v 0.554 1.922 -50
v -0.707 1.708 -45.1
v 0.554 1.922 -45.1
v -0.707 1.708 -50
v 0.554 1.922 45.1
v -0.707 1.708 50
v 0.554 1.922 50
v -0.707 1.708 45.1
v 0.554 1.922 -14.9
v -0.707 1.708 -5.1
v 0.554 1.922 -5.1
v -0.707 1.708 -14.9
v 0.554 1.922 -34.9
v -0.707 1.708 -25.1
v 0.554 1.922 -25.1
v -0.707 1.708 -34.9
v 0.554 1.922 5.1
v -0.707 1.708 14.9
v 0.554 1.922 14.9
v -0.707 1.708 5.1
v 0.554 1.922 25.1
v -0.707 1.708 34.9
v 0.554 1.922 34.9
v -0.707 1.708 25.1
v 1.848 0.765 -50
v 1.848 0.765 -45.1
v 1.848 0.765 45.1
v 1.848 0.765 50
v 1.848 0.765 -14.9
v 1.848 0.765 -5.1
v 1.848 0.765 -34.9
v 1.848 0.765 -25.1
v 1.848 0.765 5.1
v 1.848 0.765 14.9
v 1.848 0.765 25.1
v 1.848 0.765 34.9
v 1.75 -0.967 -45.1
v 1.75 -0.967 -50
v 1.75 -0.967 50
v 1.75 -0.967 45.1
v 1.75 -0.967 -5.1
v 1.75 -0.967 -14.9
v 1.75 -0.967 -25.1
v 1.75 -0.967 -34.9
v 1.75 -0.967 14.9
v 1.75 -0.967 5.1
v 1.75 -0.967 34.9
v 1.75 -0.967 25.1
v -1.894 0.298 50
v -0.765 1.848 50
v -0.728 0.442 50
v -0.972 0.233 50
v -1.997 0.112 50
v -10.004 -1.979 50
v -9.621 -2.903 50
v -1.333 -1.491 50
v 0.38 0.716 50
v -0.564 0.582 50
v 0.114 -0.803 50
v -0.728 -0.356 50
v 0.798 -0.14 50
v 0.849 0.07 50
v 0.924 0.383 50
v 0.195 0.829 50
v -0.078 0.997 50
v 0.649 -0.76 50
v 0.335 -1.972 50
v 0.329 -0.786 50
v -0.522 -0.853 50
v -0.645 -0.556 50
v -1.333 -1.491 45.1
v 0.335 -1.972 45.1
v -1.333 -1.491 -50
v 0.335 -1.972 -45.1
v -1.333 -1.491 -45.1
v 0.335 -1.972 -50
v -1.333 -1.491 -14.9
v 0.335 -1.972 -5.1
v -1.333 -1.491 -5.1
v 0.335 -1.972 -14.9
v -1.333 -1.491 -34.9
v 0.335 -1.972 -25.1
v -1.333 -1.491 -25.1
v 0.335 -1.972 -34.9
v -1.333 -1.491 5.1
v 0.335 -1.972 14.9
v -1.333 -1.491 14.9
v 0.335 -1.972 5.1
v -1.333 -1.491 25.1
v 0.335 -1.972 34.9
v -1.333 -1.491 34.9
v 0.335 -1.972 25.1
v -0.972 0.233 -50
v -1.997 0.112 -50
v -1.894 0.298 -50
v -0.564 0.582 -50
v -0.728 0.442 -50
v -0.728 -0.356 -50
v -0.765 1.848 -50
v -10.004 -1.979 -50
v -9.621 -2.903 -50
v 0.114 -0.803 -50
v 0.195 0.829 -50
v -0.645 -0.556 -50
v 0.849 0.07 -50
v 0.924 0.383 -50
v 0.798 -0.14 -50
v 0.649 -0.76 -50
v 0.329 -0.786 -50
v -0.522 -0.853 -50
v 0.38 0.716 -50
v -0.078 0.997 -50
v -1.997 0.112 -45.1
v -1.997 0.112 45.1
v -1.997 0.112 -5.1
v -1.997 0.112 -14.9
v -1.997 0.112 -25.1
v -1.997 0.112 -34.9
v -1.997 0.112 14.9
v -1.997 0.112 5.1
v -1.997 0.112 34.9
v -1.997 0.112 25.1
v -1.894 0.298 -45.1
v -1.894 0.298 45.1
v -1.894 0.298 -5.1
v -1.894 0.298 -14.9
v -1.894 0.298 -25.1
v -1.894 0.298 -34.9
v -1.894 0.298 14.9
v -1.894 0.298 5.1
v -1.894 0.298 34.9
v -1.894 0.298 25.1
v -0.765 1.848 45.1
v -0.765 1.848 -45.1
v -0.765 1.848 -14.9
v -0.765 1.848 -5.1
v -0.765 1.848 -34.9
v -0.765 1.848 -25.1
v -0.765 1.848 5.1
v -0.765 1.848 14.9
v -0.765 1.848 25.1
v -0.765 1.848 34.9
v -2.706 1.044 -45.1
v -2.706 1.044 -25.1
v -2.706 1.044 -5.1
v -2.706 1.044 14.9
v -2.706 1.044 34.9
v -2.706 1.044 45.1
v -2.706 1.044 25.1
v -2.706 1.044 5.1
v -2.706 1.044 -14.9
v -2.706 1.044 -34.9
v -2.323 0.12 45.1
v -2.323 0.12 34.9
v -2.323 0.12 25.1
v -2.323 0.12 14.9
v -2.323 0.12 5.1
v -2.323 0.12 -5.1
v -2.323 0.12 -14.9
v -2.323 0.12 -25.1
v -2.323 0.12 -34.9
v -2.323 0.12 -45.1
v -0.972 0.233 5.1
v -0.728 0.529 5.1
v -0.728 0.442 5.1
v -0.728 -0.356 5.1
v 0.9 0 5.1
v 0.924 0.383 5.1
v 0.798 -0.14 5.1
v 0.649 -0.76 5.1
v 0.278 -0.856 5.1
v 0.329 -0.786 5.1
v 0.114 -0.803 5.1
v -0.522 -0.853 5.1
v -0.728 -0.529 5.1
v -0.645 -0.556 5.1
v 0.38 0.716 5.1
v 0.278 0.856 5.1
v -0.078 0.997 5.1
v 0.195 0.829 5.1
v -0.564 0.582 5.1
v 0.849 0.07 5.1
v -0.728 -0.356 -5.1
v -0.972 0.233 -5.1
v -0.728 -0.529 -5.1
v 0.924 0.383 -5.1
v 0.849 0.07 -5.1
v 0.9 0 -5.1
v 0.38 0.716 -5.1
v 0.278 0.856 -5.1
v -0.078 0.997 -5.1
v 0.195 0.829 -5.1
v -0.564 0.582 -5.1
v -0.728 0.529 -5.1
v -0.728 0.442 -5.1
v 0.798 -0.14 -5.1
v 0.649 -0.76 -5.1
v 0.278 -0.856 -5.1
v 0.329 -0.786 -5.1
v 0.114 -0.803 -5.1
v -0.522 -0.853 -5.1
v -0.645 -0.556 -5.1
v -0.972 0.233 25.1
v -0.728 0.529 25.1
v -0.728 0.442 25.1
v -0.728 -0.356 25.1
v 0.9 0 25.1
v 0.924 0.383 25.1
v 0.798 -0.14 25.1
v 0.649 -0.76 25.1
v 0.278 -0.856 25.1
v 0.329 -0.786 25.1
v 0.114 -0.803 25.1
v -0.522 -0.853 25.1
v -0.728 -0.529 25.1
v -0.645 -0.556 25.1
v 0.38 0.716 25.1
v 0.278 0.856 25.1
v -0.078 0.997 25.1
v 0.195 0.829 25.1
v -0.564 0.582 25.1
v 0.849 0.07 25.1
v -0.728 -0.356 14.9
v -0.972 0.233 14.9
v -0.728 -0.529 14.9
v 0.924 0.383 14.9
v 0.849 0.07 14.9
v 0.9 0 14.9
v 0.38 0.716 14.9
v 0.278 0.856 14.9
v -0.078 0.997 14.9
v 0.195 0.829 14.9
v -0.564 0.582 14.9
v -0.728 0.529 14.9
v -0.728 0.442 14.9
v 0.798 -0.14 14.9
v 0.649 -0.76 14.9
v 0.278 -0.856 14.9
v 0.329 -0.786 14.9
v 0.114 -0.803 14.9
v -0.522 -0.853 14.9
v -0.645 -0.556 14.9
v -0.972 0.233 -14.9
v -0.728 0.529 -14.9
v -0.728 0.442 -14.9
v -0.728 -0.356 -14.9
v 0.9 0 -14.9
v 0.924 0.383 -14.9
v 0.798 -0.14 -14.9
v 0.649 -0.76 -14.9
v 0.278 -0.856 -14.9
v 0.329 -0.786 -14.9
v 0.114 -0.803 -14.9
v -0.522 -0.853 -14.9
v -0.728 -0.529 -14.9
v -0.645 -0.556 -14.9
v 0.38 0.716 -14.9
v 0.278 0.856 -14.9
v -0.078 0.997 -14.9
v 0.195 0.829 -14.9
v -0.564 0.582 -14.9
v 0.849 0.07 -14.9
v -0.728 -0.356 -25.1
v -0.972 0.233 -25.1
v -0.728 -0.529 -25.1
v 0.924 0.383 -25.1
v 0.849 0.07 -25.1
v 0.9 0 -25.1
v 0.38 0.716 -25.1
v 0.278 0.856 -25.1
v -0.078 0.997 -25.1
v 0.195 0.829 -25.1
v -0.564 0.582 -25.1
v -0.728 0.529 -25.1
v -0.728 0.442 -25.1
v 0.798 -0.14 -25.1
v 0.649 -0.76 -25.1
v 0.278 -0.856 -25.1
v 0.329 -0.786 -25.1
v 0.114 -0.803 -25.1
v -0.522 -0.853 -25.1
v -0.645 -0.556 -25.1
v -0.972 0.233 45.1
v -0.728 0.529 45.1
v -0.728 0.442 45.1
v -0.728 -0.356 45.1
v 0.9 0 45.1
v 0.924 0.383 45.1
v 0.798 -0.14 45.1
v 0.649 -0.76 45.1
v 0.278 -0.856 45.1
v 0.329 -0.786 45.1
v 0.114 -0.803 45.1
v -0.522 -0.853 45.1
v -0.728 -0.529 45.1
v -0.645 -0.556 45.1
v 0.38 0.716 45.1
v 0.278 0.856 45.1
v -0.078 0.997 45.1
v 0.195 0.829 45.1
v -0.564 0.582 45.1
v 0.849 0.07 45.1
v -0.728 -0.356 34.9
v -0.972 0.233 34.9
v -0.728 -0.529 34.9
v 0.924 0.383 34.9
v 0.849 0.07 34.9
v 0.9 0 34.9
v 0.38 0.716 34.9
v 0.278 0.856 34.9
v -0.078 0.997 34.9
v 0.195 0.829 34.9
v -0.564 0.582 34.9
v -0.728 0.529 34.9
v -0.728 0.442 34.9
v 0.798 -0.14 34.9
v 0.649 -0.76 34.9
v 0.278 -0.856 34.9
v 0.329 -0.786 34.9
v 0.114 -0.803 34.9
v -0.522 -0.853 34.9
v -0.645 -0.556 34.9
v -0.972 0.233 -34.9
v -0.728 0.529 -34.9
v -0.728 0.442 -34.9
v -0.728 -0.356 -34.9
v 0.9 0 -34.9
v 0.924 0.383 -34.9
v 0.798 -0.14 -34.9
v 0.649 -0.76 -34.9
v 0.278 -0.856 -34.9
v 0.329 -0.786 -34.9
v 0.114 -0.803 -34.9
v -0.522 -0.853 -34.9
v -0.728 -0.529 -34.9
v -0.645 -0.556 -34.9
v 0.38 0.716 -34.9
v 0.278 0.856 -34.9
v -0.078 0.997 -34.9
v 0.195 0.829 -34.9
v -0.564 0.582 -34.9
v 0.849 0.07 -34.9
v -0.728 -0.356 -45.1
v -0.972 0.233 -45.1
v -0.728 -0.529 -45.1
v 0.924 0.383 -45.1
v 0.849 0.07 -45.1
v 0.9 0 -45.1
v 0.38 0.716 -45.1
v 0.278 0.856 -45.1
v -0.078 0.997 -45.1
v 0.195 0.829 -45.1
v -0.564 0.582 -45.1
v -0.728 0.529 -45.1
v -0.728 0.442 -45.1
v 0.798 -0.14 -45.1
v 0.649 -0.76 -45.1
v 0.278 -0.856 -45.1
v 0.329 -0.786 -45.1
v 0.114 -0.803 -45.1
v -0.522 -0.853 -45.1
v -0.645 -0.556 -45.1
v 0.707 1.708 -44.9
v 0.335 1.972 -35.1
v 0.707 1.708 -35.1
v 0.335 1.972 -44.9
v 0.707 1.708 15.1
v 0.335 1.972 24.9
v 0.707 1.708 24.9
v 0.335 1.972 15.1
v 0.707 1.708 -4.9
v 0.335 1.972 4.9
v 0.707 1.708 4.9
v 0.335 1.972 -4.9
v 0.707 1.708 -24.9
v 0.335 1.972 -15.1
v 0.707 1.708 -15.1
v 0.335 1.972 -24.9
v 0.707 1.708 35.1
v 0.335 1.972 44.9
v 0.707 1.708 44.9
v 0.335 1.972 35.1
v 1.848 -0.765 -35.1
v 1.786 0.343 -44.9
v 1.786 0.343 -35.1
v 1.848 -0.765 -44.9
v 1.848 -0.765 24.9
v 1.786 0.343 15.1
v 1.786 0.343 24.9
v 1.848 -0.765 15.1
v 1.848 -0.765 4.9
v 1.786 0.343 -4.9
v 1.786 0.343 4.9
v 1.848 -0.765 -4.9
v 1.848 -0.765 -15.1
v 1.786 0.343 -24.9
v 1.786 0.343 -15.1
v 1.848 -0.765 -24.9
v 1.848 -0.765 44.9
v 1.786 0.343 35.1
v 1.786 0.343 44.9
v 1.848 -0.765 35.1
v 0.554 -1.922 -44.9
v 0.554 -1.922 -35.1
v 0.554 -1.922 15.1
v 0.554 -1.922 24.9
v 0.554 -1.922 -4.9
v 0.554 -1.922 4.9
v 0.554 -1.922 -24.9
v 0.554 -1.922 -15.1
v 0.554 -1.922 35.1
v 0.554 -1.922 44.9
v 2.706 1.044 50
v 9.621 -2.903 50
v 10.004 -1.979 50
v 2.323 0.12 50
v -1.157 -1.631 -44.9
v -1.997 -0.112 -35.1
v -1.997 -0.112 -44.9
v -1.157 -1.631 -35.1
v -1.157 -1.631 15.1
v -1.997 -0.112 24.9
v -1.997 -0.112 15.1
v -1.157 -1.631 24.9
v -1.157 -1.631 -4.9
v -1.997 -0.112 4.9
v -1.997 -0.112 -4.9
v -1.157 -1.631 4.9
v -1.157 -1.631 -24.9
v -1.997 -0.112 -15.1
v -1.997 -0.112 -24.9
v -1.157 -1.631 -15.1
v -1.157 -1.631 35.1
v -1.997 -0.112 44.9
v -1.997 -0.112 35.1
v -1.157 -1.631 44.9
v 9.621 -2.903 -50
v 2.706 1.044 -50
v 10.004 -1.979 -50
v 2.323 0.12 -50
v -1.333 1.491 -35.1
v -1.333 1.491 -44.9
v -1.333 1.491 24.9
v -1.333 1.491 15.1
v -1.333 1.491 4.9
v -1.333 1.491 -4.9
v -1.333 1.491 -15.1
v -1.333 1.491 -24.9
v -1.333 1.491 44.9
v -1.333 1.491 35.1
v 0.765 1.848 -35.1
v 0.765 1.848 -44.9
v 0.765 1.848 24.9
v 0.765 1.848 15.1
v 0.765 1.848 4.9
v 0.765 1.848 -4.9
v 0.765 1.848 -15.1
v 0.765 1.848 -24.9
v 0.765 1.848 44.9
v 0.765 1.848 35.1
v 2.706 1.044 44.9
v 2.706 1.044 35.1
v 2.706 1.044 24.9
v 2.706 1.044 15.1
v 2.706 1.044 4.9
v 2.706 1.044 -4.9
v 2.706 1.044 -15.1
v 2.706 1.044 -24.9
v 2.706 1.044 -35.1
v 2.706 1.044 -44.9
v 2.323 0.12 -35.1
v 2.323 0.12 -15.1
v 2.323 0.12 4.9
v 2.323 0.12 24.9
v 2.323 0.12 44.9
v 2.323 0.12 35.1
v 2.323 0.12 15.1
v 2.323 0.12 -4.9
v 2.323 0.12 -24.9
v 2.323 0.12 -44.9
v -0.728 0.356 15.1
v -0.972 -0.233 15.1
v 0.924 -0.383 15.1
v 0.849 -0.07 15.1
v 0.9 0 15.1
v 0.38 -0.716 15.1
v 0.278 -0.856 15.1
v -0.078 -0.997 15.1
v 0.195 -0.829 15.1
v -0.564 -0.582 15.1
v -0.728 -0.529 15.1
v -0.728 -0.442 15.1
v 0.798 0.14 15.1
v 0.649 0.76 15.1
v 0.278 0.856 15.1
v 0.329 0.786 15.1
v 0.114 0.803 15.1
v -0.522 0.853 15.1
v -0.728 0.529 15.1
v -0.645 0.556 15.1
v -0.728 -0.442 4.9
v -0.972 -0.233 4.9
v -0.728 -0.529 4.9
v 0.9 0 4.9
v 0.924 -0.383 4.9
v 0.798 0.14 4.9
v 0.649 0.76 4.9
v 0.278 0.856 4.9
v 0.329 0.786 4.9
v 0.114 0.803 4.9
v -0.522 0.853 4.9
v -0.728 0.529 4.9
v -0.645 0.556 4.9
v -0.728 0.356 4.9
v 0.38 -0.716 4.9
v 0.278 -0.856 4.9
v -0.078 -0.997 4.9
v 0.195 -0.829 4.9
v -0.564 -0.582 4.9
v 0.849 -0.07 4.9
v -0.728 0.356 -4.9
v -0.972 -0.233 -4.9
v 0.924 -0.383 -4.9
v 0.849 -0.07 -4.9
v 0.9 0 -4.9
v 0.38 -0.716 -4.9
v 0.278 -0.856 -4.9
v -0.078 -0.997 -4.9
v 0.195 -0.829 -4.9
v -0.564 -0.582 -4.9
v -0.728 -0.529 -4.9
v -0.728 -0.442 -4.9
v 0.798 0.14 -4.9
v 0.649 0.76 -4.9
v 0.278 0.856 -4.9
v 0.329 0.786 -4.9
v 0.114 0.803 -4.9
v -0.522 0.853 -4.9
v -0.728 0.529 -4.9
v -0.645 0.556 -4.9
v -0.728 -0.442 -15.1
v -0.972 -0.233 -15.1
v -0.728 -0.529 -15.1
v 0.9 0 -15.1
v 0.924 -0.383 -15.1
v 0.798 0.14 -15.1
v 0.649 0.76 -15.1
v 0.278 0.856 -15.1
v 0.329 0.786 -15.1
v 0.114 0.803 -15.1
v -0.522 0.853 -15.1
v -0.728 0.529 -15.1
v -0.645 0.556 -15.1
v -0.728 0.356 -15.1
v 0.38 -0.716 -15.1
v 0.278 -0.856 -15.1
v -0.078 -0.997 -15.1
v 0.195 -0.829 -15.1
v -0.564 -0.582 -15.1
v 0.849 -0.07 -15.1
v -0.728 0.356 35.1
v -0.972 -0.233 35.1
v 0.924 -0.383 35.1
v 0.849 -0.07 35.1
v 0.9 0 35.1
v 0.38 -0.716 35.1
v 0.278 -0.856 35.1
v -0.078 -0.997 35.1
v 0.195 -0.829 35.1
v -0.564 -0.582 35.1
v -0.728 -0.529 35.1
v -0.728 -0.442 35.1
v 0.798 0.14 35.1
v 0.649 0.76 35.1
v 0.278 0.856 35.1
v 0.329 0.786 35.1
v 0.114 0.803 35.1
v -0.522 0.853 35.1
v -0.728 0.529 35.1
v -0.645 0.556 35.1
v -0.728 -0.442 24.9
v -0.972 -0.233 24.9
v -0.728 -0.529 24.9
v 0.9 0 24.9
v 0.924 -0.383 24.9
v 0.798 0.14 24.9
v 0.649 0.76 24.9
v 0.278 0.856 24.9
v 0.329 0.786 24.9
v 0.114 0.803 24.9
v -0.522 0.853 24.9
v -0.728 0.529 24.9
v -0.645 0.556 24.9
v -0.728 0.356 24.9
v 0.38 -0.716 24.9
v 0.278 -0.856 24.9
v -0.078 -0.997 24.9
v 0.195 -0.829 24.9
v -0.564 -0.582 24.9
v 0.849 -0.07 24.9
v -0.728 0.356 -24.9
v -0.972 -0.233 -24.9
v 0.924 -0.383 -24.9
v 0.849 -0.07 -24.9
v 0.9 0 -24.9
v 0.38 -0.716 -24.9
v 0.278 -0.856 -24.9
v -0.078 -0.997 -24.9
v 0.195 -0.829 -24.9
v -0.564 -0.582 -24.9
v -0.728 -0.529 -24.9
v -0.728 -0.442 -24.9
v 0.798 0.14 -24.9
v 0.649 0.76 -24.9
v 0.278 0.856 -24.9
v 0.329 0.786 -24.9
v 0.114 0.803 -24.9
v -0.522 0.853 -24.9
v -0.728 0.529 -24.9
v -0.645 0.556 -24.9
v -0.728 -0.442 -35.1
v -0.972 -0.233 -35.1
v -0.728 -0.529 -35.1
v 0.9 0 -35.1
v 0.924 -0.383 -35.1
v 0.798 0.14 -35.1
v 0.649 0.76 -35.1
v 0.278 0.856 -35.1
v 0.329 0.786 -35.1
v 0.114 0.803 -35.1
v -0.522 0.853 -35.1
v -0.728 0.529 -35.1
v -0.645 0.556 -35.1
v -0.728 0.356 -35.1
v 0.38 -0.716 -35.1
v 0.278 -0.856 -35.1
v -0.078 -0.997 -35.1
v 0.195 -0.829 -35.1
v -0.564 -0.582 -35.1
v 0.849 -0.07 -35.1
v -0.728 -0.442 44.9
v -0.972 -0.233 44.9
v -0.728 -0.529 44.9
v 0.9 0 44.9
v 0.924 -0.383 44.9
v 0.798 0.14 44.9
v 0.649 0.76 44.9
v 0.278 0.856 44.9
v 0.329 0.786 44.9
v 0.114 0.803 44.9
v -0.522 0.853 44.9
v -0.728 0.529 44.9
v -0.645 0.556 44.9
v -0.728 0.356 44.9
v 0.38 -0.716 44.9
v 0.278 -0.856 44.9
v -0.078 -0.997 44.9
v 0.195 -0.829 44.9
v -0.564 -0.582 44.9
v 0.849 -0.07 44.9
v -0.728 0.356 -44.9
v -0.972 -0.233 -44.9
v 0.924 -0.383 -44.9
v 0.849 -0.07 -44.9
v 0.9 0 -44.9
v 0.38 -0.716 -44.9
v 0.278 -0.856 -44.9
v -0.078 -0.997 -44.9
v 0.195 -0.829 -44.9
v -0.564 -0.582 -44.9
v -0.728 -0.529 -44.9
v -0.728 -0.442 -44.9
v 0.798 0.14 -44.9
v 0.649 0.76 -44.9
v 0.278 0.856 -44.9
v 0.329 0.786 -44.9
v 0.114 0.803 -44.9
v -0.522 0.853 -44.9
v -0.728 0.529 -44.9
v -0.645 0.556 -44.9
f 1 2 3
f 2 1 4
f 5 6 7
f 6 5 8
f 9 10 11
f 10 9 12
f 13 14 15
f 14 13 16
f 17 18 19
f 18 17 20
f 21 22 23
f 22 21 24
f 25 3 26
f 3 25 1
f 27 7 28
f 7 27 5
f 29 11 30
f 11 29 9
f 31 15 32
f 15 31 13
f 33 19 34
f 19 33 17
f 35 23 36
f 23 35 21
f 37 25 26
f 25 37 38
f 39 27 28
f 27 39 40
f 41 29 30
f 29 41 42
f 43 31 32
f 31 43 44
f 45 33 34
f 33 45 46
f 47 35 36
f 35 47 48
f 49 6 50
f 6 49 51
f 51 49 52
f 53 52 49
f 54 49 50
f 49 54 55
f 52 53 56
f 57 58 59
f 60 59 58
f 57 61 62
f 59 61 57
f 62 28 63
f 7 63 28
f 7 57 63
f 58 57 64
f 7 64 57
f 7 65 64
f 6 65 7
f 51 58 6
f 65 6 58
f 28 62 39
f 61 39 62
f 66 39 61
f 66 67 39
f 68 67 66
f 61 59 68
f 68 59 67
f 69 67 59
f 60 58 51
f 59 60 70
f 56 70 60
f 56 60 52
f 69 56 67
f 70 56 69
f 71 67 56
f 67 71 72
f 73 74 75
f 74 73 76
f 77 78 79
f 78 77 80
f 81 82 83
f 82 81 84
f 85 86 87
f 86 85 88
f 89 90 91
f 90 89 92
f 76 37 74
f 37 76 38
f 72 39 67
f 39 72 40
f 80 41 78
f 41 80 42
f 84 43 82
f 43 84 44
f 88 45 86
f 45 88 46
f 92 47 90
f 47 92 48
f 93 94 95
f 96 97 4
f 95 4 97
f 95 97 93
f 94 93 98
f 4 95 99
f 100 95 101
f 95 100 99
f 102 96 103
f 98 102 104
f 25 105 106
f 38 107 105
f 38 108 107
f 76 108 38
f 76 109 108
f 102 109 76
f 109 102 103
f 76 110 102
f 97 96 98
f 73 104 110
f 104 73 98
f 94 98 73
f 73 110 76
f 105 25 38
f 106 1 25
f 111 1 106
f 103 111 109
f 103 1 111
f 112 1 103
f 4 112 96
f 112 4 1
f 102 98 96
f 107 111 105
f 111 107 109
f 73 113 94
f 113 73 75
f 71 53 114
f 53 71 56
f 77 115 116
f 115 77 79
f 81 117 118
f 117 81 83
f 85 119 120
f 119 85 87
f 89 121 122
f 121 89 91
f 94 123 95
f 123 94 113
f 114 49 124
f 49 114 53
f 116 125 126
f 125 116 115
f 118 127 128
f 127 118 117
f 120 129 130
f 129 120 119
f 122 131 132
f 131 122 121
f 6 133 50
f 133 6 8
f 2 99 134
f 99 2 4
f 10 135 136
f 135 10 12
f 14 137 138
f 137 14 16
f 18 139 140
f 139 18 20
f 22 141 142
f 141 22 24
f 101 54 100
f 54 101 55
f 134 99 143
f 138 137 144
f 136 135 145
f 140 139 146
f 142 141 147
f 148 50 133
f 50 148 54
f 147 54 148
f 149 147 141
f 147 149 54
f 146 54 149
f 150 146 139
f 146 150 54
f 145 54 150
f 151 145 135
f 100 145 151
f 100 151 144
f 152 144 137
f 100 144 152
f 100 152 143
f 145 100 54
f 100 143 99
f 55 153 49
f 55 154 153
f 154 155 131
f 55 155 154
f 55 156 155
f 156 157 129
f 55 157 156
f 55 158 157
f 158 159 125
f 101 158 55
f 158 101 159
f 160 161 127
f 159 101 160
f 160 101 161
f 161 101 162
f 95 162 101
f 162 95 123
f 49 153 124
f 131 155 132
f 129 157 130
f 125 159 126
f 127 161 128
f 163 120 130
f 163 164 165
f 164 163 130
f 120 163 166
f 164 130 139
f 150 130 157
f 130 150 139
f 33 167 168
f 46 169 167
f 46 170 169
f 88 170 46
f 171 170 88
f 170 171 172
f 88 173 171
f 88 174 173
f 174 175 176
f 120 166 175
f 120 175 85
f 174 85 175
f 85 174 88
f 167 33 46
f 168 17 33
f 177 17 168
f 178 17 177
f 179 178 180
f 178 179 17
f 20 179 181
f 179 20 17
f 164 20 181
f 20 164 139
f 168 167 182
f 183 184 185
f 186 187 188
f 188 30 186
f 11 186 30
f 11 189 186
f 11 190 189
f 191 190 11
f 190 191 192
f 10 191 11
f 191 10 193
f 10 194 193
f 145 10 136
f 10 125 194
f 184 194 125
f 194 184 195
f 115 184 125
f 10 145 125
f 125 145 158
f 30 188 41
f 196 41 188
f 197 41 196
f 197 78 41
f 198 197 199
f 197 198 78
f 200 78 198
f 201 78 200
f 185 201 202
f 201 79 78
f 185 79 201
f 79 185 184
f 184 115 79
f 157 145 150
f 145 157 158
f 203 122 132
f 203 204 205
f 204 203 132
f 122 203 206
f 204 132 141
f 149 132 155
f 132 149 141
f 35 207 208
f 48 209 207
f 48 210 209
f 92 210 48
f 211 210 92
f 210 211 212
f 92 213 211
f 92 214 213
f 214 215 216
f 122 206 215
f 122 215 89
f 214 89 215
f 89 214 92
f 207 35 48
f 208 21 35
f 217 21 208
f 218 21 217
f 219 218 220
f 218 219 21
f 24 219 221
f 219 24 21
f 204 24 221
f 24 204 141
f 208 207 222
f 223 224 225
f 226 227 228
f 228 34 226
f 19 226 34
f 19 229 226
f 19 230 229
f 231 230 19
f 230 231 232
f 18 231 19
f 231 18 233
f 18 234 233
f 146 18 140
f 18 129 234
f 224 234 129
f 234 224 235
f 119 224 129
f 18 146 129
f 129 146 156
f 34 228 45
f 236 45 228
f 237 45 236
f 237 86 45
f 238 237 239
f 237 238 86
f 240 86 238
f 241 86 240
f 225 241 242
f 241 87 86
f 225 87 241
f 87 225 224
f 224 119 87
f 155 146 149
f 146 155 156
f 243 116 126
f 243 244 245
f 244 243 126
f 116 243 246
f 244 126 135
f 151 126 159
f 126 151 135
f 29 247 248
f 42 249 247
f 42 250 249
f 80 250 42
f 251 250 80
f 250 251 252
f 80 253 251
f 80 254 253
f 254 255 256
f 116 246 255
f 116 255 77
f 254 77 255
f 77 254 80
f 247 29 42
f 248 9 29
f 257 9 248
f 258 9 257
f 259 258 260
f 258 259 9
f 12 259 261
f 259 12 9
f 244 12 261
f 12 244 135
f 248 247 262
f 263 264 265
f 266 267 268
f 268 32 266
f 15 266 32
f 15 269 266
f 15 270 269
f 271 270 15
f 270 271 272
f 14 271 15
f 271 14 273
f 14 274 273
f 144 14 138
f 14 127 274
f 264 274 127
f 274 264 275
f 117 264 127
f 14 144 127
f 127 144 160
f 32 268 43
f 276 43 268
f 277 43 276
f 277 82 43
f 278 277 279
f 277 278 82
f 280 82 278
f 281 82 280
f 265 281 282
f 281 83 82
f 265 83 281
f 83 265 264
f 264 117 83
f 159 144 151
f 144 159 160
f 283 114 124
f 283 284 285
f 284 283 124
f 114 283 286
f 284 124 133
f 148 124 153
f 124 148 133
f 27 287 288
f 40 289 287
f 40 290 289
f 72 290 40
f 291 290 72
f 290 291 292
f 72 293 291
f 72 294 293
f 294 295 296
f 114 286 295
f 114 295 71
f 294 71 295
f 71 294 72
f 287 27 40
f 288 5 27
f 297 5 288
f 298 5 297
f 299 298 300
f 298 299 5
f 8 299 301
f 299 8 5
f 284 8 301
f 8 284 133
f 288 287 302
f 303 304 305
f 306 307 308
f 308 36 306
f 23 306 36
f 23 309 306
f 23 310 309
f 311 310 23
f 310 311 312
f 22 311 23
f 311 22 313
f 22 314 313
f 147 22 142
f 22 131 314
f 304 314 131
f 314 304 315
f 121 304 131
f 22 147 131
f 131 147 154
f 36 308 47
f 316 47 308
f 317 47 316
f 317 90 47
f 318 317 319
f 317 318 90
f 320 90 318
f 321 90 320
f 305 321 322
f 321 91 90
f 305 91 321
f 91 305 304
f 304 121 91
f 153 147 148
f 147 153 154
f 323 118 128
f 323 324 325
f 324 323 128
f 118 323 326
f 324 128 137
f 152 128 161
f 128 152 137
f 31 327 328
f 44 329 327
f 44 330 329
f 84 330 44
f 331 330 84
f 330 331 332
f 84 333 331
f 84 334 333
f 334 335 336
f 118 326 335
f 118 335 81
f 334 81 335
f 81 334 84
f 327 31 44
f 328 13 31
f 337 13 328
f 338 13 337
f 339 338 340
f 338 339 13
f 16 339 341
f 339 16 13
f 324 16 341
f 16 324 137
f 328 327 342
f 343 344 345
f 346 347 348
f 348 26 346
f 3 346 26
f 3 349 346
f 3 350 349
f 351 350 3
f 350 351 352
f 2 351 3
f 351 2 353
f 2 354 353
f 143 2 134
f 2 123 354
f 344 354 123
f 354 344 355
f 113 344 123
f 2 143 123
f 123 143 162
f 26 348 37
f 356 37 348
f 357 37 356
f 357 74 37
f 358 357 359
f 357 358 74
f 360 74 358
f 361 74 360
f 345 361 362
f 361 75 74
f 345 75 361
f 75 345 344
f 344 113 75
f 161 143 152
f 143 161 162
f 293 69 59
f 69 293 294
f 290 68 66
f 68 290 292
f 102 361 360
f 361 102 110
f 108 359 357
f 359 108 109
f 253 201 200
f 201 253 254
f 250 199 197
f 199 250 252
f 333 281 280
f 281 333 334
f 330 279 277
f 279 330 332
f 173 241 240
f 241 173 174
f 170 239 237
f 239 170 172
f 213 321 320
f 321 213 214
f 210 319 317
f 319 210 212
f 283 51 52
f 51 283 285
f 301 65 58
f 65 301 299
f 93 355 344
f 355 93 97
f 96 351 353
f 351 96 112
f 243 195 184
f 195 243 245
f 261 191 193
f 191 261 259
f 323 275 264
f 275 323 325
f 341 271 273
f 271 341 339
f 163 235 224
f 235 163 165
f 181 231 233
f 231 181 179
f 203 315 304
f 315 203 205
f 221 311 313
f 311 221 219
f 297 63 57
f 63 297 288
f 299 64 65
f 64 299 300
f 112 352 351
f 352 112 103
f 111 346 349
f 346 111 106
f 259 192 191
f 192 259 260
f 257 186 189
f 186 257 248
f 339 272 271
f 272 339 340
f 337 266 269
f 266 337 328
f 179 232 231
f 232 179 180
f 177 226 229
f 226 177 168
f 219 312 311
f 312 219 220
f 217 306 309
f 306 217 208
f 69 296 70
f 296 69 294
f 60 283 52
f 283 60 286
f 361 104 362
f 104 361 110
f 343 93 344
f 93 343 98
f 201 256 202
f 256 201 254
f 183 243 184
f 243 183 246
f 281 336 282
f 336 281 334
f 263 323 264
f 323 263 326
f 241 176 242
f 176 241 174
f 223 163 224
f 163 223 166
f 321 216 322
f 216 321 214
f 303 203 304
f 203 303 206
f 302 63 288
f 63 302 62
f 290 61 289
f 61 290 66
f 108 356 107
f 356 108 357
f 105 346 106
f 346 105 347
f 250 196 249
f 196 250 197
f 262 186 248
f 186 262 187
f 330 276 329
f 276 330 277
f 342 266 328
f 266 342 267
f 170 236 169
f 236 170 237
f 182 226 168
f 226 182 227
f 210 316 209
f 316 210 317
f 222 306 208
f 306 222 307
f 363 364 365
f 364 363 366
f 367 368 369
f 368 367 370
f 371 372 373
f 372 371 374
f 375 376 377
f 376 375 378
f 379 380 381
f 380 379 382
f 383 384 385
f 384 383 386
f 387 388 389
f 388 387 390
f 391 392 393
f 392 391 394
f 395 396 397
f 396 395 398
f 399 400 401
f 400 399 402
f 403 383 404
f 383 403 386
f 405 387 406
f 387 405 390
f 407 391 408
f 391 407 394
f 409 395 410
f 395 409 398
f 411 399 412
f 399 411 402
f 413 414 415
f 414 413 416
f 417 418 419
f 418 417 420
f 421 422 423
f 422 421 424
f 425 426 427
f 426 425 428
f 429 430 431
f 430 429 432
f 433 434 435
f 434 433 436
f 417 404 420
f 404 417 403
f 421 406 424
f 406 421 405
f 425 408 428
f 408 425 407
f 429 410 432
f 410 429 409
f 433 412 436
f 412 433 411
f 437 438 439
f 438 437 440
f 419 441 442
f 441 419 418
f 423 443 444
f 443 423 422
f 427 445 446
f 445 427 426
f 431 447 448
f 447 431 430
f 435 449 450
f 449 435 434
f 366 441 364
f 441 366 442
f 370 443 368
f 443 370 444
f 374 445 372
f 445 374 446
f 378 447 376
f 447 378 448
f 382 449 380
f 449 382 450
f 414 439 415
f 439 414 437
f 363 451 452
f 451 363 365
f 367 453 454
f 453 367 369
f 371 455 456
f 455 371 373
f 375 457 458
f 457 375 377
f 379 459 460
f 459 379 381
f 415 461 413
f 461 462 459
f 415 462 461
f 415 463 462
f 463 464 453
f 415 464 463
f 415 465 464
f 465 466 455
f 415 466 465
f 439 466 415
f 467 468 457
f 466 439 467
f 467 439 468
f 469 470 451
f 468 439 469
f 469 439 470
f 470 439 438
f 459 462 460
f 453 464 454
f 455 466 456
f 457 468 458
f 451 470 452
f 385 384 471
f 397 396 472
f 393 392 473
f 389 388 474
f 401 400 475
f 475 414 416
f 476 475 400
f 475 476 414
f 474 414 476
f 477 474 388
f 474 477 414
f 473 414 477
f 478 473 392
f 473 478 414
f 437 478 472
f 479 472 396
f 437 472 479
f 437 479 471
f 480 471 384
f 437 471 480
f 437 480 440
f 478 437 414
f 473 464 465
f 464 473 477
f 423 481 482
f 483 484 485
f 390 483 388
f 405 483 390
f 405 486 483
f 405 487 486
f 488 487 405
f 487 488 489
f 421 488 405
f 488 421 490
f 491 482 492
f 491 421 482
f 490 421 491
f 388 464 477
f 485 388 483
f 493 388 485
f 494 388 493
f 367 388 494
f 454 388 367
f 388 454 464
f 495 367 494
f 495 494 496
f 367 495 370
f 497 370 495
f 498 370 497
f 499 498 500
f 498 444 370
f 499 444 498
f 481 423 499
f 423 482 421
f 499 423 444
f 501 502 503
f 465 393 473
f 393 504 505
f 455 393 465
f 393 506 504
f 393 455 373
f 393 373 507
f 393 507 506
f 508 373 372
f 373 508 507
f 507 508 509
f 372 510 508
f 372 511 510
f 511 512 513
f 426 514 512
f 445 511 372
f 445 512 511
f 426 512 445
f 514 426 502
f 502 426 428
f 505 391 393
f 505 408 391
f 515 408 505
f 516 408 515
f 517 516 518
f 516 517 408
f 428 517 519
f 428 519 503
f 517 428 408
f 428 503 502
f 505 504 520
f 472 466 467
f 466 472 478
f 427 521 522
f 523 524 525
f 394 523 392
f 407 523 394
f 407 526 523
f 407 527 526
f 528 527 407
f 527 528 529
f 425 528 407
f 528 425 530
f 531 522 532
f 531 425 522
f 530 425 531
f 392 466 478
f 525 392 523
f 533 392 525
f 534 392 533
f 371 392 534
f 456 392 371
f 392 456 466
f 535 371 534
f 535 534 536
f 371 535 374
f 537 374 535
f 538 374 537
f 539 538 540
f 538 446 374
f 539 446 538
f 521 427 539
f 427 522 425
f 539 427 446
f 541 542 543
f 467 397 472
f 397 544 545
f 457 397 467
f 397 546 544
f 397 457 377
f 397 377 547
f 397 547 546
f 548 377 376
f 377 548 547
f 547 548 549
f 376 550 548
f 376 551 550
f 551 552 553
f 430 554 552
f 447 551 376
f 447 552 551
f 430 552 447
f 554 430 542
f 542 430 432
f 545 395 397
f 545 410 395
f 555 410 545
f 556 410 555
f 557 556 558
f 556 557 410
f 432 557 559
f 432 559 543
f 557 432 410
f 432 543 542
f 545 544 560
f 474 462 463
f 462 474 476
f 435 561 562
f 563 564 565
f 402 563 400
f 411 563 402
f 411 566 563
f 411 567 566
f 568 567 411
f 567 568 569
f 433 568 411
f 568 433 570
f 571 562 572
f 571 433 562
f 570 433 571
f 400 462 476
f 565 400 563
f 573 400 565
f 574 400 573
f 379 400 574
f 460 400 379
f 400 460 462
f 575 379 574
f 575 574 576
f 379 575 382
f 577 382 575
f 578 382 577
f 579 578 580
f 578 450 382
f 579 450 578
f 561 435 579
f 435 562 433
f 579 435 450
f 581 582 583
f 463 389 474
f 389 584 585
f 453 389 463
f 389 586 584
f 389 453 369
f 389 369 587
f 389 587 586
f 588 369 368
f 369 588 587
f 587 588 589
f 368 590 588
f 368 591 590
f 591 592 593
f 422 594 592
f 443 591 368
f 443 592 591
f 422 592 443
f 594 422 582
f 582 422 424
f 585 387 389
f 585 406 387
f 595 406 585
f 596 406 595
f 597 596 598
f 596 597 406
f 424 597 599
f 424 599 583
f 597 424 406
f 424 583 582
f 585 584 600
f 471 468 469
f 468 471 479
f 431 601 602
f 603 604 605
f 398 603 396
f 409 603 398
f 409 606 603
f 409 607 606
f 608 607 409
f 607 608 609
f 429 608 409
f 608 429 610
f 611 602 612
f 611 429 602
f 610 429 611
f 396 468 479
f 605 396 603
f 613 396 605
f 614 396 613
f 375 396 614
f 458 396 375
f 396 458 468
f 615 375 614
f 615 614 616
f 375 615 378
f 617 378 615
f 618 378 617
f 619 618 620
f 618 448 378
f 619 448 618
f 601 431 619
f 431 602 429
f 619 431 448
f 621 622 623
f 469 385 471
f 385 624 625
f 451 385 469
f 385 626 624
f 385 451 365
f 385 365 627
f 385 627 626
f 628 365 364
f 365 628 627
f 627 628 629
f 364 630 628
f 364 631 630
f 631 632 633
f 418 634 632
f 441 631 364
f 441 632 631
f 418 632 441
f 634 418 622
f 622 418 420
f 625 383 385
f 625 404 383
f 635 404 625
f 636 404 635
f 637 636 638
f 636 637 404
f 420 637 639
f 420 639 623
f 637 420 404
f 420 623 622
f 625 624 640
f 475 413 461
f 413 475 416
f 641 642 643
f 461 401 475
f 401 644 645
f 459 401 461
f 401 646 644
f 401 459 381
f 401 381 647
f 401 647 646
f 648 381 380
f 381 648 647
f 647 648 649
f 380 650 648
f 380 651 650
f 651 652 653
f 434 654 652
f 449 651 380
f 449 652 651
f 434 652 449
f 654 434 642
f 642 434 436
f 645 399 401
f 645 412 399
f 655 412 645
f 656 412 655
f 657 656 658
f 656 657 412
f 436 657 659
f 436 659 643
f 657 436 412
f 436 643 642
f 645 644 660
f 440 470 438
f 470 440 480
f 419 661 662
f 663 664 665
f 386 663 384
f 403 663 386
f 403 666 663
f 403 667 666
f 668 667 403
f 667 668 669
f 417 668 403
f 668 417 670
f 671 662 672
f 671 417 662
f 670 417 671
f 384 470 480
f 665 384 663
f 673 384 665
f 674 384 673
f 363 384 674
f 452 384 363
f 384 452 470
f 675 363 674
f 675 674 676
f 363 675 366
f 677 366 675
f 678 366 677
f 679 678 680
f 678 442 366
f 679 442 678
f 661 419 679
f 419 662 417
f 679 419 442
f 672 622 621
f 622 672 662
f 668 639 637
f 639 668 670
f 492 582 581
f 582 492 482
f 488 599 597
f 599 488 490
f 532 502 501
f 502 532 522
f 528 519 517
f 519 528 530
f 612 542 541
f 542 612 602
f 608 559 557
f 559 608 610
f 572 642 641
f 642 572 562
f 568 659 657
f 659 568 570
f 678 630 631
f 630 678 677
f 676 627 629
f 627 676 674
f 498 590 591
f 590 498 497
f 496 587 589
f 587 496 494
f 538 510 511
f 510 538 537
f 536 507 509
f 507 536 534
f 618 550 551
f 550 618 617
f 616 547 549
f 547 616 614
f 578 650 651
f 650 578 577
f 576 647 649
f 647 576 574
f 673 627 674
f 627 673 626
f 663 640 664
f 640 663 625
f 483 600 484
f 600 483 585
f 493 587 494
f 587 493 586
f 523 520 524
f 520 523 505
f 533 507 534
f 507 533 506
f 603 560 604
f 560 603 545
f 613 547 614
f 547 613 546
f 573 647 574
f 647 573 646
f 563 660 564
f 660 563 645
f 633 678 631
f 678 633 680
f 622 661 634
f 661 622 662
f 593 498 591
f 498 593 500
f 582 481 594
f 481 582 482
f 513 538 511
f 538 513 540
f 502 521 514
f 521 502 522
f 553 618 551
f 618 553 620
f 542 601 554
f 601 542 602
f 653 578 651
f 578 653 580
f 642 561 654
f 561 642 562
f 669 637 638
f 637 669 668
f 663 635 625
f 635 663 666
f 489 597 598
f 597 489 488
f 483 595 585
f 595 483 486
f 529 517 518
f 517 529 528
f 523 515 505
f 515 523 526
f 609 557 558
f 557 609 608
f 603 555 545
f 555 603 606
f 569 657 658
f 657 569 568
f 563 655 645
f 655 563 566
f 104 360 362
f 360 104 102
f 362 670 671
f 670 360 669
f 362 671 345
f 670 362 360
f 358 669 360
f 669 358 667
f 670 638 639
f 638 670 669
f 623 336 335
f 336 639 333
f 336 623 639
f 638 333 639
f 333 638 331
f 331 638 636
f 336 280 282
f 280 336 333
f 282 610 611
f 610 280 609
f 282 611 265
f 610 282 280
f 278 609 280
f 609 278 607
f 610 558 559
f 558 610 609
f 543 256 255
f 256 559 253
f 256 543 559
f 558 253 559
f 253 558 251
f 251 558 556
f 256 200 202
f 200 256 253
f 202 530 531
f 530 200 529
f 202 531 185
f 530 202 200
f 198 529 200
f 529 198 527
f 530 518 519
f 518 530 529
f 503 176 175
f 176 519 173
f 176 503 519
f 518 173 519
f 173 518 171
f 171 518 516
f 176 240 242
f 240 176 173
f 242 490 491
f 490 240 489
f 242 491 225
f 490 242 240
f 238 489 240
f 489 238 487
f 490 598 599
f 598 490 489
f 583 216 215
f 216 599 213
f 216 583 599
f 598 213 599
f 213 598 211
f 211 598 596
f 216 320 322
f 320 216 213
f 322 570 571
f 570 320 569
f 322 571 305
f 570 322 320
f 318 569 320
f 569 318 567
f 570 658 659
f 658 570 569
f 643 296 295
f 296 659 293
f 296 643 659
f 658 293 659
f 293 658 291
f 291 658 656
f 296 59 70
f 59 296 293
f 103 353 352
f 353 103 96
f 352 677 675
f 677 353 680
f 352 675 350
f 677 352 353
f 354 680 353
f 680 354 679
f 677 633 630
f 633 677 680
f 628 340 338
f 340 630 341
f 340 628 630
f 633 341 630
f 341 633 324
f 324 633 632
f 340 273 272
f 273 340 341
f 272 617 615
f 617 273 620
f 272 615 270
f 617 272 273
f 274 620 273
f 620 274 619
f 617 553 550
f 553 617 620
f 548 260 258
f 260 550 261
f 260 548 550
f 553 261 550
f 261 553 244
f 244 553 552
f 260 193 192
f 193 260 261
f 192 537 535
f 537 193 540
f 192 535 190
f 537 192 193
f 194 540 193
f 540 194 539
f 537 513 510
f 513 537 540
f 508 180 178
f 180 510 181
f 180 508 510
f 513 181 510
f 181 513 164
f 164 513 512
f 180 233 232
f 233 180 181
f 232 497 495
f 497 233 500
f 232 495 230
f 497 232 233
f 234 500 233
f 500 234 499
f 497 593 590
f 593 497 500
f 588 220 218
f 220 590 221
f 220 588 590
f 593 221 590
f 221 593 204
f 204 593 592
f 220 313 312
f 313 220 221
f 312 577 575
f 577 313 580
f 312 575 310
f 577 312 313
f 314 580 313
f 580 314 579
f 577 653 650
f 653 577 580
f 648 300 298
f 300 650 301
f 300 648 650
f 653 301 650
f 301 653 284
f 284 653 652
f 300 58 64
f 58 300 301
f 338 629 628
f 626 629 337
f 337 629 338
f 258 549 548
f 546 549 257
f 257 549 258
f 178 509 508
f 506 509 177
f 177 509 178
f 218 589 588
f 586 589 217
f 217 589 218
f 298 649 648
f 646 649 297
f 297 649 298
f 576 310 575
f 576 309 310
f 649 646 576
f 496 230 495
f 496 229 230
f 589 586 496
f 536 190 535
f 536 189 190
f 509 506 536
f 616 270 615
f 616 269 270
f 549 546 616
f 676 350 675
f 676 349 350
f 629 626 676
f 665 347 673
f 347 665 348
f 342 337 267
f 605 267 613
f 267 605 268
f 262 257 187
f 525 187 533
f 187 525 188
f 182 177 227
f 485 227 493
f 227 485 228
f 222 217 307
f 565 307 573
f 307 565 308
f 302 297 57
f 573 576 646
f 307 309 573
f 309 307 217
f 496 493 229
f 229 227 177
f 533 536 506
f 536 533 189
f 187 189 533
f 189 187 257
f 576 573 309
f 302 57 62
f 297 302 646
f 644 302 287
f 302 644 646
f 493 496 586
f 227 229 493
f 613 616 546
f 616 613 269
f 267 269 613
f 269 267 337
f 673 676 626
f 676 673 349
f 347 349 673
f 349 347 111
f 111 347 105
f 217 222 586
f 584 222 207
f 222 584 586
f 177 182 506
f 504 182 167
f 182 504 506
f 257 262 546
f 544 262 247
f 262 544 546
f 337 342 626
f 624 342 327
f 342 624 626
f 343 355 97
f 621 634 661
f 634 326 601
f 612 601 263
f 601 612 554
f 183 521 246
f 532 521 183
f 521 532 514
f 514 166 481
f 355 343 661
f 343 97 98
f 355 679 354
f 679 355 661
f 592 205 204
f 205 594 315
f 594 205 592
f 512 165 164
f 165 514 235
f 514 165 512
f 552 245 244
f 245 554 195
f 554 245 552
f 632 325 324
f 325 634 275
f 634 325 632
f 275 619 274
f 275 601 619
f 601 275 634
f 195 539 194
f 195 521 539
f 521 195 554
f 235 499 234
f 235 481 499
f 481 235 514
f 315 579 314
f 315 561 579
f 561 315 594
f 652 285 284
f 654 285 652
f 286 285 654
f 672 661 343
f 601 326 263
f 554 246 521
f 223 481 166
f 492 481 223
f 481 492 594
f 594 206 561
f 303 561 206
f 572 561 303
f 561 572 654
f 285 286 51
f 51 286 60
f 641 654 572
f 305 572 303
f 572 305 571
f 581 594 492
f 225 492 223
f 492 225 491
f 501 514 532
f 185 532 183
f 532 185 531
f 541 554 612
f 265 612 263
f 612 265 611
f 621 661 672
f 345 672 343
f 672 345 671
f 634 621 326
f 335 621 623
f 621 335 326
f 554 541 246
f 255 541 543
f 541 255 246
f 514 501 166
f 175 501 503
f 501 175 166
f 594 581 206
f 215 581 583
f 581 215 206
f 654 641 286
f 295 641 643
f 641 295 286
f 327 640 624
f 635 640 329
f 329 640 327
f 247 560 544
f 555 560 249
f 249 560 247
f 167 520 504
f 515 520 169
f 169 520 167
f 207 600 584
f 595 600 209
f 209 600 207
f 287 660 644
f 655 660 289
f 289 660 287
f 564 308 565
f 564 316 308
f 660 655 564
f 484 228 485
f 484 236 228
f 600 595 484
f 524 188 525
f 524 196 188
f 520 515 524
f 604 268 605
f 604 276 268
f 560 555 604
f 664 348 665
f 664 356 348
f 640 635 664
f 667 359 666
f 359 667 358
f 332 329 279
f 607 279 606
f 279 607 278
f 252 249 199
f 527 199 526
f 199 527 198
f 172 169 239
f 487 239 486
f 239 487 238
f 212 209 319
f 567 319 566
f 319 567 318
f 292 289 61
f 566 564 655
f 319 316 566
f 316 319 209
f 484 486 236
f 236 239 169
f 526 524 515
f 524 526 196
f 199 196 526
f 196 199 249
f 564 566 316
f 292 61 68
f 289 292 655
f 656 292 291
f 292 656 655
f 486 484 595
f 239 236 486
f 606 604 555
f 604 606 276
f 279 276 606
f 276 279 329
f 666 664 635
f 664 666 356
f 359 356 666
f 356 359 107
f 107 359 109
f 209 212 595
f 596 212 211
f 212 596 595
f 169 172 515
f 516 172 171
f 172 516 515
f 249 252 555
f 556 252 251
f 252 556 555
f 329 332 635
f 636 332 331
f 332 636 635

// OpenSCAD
/*******************************************************************************\
|						Library for modeling a Piano Hinge.						|
|							Copyright 2026 Joshua Lucas 						|
\*******************************************************************************/

// Animated demo/test.
piano_hinge (
	length = sin ( 360 * $t ) * 100 + 100,
	angle = 135 * sin ( 360 * $t ) - 45
);

// Create a piano hinge.
module piano_hinge (
	length,
	angle			= 0,
	center			= true,
	clearance		= 0.1,
	diameter		= 4,
	knuckleLength	= 10,
	leafColors		= [ "LightBlue", "Orange" ],
	leafThickness	= 1,
	leafWidth		= 10,
	pinColor		= "LightGreen",
	pinDiameter		= 2
) {
	// Pin
	color ( pinColor ) {
		_piano_hinge_pin (
			length		= length,
			clearance	= clearance,
			pinDiameter	= pinDiameter
		);
	}

	// Leaves
	for ( side = [ 0, 1 ] ) {
		rotate ( ( 2 * side - 1 ) * angle / 2 ) {
			color ( leafColors[side] ) {
				_piano_hinge_leaf (
					center			= center,
					clearance		= clearance,
					diameter		= diameter,
					knuckleLength	= knuckleLength,
					leafThickness	= leafThickness,
					leafWidth		= leafWidth,
					length 			= length,
					pinDiameter		= pinDiameter,
					side			= side
				);
			}
		}
	}
}

module _piano_hinge_leaf (
	center,
	clearance,
	diameter,
	knuckleLength,
	leafThickness,
	leafWidth,
	length,
	pinDiameter,
	side
) {
	// Knuckles
	difference () {
		union () {
			cylinder ( d = diameter, h = length, center = true );

			// Leaf
			translate ( [
				( 2 * side - 1 ) * leafWidth / 2,
				( diameter - leafThickness ) / 2,
				0
			] ) {
				cube ( [ leafWidth, leafThickness, length ], center = true );
			}
		}

		// Pin hole
		translate ( [ 0, 0, -clearance ] ) {
			cylinder (
				d = pinDiameter,
				h = length + 2 * clearance,
				center = true
			);
		}

		knuckle_count = floor ( length / knuckleLength / 2 );
		for ( i = [ 0 : knuckle_count ], j = [ 1, -1 ] ) {
			translate ( [
				0,
				0,
				j * ( 2 * i + side ) * knuckleLength + ( center ? 0 : knuckleLength / 2 )
			] ) {
				cube (
					[
						diameter,
						diameter,
						knuckleLength
					] + clearance * [ 2, 2, 2 ],
					center = true
				);
			}
		}
	}
}

module _piano_hinge_pin (
	clearance,
	length,
	pinDiameter
) {
	cylinder ( d = pinDiameter - 2 * clearance, h = length, center = true );
}
